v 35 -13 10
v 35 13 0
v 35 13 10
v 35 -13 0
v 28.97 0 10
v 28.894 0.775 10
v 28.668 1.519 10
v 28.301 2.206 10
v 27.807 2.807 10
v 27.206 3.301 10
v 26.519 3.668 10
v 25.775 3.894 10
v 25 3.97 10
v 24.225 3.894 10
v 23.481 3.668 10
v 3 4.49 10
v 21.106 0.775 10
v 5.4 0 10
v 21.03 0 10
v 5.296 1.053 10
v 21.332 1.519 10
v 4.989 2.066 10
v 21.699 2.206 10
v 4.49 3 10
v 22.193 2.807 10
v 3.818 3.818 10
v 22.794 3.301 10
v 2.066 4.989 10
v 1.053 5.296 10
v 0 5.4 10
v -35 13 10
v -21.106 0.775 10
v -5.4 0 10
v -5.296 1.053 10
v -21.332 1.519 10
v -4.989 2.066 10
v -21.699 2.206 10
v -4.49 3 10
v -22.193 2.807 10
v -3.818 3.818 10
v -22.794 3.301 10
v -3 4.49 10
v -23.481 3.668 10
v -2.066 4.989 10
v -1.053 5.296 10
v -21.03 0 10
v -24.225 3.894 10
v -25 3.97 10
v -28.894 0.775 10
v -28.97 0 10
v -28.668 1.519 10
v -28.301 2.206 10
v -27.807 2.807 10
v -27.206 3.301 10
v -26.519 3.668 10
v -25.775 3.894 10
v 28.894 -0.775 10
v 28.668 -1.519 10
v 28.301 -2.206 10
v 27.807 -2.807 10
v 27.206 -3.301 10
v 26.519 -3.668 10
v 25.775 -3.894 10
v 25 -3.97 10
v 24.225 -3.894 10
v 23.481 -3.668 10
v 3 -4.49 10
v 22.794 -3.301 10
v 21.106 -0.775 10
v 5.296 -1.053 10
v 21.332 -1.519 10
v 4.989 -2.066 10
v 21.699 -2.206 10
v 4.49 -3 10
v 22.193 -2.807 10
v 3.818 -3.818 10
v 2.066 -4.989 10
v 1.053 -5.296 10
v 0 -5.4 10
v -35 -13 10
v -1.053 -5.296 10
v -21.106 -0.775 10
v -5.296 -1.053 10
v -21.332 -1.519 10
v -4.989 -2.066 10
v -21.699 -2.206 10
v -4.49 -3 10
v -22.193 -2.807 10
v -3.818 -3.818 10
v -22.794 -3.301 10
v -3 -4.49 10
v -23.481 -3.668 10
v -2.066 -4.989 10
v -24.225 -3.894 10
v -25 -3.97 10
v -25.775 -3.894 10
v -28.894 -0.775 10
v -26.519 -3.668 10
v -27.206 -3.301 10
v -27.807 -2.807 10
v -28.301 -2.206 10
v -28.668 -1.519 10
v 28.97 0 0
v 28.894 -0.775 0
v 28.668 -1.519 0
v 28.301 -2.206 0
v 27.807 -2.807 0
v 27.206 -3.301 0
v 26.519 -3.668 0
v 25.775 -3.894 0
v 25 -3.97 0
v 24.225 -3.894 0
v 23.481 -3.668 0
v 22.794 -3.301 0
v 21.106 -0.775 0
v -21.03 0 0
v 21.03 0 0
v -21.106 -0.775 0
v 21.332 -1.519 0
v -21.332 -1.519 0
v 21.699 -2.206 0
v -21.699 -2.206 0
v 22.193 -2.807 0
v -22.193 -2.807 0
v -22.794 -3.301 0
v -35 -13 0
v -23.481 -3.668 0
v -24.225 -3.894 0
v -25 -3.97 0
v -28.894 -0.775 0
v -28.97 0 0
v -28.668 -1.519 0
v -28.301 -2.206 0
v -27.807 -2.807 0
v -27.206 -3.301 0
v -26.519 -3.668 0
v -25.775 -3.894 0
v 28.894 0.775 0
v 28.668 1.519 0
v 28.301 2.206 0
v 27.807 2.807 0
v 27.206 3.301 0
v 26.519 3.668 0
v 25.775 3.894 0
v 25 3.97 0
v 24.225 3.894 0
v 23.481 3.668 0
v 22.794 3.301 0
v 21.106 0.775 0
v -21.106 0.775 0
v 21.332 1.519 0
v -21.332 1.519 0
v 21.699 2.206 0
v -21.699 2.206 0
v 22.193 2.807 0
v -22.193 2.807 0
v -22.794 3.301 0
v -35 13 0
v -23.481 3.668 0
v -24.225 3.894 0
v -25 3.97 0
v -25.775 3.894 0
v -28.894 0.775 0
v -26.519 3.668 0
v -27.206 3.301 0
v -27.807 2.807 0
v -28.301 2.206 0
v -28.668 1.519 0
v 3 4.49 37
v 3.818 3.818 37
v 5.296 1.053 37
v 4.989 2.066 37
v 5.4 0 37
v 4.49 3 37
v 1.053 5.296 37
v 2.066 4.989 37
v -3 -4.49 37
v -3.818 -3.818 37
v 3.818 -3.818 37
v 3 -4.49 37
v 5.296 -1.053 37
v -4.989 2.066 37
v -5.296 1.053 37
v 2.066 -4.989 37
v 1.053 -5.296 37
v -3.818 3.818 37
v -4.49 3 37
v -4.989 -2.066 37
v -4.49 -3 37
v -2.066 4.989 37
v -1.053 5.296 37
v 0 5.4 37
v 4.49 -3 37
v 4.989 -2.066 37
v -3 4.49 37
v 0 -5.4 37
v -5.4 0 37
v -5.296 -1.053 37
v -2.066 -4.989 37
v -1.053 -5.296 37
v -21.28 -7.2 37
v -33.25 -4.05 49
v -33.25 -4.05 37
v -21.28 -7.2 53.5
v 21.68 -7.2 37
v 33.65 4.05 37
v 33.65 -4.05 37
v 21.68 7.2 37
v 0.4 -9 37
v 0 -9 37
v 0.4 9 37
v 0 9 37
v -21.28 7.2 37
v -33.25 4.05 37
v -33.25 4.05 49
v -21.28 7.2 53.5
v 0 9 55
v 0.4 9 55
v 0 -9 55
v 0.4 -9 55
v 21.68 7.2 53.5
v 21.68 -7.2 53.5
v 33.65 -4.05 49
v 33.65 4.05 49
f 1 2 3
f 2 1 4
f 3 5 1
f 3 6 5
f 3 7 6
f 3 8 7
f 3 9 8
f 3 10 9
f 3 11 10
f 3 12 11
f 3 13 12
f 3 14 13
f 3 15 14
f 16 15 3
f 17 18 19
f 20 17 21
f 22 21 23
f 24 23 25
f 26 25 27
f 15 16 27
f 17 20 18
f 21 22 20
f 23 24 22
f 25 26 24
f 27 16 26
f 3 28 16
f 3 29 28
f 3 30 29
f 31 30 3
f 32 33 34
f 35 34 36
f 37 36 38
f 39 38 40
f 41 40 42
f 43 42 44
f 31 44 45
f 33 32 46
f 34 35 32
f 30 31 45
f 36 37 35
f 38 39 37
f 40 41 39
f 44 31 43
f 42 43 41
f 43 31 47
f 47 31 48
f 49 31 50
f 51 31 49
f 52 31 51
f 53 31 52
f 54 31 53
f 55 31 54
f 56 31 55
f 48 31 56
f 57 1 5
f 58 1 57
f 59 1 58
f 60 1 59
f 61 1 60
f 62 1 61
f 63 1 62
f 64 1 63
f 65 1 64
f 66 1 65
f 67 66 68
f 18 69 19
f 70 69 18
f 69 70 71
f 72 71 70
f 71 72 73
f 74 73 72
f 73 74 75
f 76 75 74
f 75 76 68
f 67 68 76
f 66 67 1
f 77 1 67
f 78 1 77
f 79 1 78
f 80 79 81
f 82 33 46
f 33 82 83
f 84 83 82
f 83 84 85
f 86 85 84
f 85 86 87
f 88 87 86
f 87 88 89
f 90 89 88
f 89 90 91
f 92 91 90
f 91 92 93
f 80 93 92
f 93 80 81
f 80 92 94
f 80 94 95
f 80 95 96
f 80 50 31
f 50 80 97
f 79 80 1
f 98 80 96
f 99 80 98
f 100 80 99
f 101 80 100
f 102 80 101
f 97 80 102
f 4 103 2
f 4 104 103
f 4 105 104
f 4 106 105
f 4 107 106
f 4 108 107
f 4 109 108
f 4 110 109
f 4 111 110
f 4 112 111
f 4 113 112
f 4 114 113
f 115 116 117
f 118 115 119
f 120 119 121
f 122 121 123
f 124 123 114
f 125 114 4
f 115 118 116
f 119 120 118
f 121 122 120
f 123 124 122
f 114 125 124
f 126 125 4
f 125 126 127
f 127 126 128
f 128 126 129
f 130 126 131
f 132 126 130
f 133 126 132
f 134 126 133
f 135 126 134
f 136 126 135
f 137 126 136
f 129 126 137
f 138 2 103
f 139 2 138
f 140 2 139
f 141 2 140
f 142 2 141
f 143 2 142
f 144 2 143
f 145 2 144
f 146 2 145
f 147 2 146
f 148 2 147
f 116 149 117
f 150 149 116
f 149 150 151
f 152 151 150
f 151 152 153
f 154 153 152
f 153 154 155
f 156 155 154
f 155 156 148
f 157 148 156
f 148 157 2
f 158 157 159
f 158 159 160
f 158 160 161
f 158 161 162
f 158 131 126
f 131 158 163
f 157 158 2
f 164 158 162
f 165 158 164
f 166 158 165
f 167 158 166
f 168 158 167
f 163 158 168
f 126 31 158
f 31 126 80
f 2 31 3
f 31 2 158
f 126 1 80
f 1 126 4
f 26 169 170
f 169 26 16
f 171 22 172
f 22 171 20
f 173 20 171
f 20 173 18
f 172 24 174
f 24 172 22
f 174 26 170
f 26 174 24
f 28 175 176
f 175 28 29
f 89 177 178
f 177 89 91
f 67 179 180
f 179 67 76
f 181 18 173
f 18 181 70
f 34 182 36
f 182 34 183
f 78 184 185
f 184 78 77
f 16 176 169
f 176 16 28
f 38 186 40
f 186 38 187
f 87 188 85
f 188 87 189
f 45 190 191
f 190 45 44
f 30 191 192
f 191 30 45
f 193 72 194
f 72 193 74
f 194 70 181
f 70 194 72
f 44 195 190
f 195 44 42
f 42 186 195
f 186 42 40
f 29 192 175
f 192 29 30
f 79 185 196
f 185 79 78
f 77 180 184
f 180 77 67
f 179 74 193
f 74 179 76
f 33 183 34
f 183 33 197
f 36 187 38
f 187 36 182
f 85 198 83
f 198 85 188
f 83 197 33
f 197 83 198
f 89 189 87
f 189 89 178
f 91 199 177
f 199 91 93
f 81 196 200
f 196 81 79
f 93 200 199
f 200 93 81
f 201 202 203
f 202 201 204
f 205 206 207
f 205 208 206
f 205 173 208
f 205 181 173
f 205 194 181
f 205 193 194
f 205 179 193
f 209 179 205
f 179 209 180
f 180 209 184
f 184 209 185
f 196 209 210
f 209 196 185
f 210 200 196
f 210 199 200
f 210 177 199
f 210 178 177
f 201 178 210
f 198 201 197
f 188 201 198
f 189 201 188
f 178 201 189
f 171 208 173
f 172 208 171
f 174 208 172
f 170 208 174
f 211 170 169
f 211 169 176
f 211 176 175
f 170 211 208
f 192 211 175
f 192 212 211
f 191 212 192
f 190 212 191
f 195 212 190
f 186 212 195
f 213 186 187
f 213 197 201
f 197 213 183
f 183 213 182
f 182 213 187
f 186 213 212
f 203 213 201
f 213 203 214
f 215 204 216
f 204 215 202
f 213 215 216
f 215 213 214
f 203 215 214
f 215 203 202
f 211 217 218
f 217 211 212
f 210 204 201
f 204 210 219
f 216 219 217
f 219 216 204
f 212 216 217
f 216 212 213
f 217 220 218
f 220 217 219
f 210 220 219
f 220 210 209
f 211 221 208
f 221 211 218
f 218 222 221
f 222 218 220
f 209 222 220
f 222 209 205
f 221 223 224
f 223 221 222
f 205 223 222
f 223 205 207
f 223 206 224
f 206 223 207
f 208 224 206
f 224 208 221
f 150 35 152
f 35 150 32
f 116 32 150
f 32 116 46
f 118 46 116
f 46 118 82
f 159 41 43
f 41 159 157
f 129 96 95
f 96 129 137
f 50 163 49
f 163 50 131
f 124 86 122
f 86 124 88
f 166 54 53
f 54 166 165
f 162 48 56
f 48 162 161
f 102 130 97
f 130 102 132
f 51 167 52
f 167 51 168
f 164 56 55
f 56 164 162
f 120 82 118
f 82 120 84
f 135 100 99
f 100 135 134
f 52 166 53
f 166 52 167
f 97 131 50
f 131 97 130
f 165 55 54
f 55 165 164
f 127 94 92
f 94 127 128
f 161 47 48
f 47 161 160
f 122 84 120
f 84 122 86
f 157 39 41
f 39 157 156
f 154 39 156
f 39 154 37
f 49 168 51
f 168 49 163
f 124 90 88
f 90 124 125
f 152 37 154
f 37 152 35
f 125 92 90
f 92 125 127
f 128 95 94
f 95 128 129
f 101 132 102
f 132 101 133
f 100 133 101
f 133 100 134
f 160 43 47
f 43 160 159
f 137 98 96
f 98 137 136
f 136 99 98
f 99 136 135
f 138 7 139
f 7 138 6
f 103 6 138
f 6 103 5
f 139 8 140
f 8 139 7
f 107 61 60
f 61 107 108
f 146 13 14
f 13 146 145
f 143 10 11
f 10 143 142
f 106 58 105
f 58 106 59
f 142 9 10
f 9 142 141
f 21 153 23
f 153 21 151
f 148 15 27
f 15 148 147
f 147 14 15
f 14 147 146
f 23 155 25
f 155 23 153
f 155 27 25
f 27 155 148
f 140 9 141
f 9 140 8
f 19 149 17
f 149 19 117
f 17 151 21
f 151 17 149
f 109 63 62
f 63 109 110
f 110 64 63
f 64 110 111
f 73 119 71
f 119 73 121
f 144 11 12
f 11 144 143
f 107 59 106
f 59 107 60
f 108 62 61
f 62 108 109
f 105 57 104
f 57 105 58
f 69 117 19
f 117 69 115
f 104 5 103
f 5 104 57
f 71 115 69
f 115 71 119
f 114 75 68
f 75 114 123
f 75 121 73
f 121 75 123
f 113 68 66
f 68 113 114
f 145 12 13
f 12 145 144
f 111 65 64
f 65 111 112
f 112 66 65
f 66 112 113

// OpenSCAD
$fn = 32;

// ----------------------------------------------------------------------
// Boat cleat: 70 mm base, horn 46 mm up
// ----------------------------------------------------------------------

// --- parameters (mm) ---
base_l = 70;              // base length
base_w = 26;              // base width
base_t = 10;              // base thickness
horn_len = 66.5;          // horn length
horn_d = 18;              // horn diameter at the middle
horn_z = 46;              // horn axis height
end_drop = 6;             // how far the horn tips drop
post_d = 10.8;            // centre post diameter
holes_d = 7.94;           // fixing holes
hole_x = 25;              // fixing hole spacing

difference() {
  union() {
    translate([-35, -13, 0]) cube([base_l, base_w, base_t]);
    /* centre post, sunk 1 mm into the base */
    translate([0, 0, 9]) cylinder(h = 37, d = post_d);
    /* horn: a hull chain of boxes, full in the middle and lighter at the tips */
    hull() {
      translate([-33.25, -4.05, 37]) cube([0.4, 8.1, 12], center = false);
      translate([-21.28, -7.2, 37]) cube([0.4, 14.4, 16.5], center = false);
    }
    hull() {
      translate([-21.28, -7.2, 37]) cube([0.4, 14.4, 16.5], center = false);
      translate([0, -9, 37]) cube([0.4, 18, 18], center = false);
    }
    hull() {
      translate([0, -9, 37]) cube([0.4, 18, 18], center = false);
      translate([21.28, -7.2, 37]) cube([0.4, 14.4, 16.5], center = false);
    }
    hull() {
      translate([21.28, -7.2, 37]) cube([0.4, 14.4, 16.5], center = false);
      translate([33.25, -4.05, 37]) cube([0.4, 8.1, 12], center = false);
    }
  }
  translate([-25, 0, -2.5]) cylinder(h = base_t + 5, d = holes_d);
  translate([25, 0, -2.5]) cylinder(h = base_t + 5, d = holes_d);
}
